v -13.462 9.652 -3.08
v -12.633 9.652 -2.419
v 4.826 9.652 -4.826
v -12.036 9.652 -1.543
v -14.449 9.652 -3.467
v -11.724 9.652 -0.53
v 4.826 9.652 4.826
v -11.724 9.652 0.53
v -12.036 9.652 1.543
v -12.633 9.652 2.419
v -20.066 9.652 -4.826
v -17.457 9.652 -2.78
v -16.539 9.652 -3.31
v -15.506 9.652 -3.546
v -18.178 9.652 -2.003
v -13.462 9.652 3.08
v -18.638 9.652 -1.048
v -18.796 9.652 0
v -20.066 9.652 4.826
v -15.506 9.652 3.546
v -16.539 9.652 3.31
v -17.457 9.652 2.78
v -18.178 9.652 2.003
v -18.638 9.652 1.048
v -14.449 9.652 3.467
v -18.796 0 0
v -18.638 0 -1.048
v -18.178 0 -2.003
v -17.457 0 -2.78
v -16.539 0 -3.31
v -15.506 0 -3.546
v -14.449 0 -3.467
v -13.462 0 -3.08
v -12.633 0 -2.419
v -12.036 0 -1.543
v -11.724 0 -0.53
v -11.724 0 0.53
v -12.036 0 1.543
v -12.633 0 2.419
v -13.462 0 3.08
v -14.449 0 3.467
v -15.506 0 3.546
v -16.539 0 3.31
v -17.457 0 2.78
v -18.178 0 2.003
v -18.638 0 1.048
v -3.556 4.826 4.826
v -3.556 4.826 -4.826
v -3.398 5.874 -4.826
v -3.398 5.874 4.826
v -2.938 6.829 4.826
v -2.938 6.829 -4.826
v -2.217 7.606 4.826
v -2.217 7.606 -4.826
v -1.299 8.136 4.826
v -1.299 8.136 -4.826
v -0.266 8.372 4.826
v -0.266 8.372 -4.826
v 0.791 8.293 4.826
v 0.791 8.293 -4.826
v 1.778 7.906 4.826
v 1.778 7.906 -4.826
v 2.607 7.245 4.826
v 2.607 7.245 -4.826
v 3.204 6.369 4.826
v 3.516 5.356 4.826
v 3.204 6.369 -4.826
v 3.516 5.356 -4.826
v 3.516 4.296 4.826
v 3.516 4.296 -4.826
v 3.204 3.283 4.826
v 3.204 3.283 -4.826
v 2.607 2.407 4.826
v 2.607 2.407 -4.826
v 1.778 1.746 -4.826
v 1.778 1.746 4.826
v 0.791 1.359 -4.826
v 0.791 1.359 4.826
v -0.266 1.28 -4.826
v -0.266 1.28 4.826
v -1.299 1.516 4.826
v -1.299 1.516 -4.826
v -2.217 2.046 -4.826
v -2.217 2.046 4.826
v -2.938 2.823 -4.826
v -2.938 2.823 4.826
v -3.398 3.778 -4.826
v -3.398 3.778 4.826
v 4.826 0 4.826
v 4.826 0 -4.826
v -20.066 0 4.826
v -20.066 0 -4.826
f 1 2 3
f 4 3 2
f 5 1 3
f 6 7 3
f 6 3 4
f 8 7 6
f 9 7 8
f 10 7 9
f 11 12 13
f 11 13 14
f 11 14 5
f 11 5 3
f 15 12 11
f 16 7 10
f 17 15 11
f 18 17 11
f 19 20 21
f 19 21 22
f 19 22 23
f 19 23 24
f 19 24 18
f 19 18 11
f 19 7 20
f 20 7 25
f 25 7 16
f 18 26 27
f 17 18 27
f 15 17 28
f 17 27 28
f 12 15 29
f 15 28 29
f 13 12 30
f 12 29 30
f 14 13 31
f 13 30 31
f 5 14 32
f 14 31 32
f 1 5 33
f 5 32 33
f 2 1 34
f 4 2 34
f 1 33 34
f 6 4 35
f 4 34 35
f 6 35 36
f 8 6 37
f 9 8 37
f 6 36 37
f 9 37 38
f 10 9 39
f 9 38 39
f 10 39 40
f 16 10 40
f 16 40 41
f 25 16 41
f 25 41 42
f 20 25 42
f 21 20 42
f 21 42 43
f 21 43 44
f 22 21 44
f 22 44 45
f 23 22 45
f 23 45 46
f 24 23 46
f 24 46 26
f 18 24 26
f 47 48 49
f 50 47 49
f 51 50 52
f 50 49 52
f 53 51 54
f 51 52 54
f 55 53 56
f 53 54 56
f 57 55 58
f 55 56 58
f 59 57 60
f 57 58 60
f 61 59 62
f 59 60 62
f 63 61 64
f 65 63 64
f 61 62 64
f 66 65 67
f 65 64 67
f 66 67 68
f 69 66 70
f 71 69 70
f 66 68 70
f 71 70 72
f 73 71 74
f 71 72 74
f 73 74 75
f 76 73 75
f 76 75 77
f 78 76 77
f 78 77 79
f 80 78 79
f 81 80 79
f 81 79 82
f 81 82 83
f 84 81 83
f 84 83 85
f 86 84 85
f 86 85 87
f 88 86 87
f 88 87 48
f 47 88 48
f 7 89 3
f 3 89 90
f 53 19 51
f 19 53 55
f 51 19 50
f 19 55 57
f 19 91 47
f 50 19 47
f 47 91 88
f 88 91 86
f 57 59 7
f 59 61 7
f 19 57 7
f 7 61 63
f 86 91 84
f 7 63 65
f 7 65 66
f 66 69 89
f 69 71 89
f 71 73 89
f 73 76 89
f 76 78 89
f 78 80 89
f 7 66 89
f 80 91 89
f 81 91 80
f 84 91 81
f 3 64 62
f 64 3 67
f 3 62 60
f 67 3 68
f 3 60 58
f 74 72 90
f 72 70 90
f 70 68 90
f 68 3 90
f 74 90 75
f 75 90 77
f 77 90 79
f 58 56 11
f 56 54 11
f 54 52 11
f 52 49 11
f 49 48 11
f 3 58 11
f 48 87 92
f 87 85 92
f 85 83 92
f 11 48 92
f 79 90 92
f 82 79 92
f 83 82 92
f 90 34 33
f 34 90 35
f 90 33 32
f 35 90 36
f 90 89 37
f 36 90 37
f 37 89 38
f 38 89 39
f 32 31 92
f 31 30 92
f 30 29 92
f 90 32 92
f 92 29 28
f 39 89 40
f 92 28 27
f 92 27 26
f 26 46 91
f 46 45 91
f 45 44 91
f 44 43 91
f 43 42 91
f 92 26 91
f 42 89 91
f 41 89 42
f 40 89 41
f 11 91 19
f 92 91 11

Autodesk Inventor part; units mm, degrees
ref_plane "YZ Plane" through (0, 0, 0) normal (1, 0, 0) x (0, 1, 0)
ref_plane "XZ Plane" through (0, 0, 0) normal (0, 1, 0) x (-1, 0, 0)
ref_plane "XY Plane" through (0, 0, 0) normal (0, 0, 1) x (1, 0, 0)
sketch "Sketch1" plane through (0, 0, 0) normal (0, 1, 0) x (-1, 0, 0)
  line L0 (0, 0) -> (15.24, 0)
  circle A0 centre (15.24, 0) radius 3.556
  circle A1 centre (0, 0) radius 3.556
  line L1 (18.796, 0) -> (20.066, 0)
  line L2 (15.24, -3.556) -> (15.24, -4.826)
  line L3 (15.24, -4.826) -> (0, -4.826)
  line L4 (-3.556, 0) -> (-4.826, 0)
  line L5 (-4.826, 0) -> (-4.826, -4.826)
  line L6 (-4.826, -4.826) -> (0, -4.826)
  line L7 (15.24, -4.826) -> (20.066, -4.826)
  line L8 (20.066, -4.826) -> (20.066, 0)
  line L9 (15.24, 3.556) -> (15.24, 4.826)
  line L10 (15.24, 4.826) -> (20.066, 4.826)
  line L11 (20.066, 4.826) -> (-4.826, 4.826)
  line L12 (-4.826, 4.826) -> (-4.826, 0)
  line L13 (0, -4.826) -> (-4.826, -4.826)
  line L14 (20.066, 4.826) -> (20.066, 0)
  dimension "d2" = 7.112
  dimension "d0" = 15.24
  dimension "d1" = 7.112
  dimension "d3" = 1.27
  dimension "d4" = 1.27
  dimension "d5" = 1.27
  dimension "d6" = 1.27
extrude "Extrusion1" add sketch "Sketch1" along normal blind 9.652 contours A1 L4 L12 L11 L9 A0 L0 | A1 | L0 A0 L2 L3 L6 L5 L4 A1 | L9 L10 L14 L1 A0 | A0 L1 L8 L7 L2
sketch "Sketch2" plane through (4.826, 0, -4.826) normal (0, 0, -1) x (-1, 0, 0)
  line L0 (0, 0) -> (0, 9.652) projected
  line L1 (0, 4.826) -> (4.826, 4.826)
  circle A0 centre (4.826, 4.826) radius 3.556
  point P0 (4.826, 0)
  dimension "d9" = 4.826
  dimension "d10" = 7.112
extrude "Extrusion2" cut sketch "Sketch2" against normal through all
sketch "Sketch3" plane through (4.826, 0, 4.826) normal (1, 0, 0) x (0, 0, -1)
  line L0 (4.826, 0) -> (4.826, 9.652)
  line L1 (0, 9.652) -> (9.652, 9.652) projected
  line L2 (0, 0) -> (0, 9.652) projected
  line L3 (0, 4.826) -> (9.652, 4.826)
  line L4 (9.652, 0) -> (9.652, 9.652) projected
  circle A0 centre (4.826, 4.826) radius 5.08
  dimension "d13" = 10.16
extrude "Extrusion3" add sketch "Sketch3" along normal blind 76.2 contours L3 L2 A0 L1 L0 | L3 L4 A0 L2 | L0 L1 A0 L4 L3 | L1 A0 | L2 A0 | L4 A0
sketch "Sketch4" plane through (81.026, 4.826, 0) normal (1, 0, 0) x (0, 0, -1)
  circle A0 centre (0, 0) radius 5.08
  point P0 (0, -4.826)
extrude "Extrusion4" cut sketch "Sketch4" against normal blind 76.2
properties part number "newblockwithnopeg"
